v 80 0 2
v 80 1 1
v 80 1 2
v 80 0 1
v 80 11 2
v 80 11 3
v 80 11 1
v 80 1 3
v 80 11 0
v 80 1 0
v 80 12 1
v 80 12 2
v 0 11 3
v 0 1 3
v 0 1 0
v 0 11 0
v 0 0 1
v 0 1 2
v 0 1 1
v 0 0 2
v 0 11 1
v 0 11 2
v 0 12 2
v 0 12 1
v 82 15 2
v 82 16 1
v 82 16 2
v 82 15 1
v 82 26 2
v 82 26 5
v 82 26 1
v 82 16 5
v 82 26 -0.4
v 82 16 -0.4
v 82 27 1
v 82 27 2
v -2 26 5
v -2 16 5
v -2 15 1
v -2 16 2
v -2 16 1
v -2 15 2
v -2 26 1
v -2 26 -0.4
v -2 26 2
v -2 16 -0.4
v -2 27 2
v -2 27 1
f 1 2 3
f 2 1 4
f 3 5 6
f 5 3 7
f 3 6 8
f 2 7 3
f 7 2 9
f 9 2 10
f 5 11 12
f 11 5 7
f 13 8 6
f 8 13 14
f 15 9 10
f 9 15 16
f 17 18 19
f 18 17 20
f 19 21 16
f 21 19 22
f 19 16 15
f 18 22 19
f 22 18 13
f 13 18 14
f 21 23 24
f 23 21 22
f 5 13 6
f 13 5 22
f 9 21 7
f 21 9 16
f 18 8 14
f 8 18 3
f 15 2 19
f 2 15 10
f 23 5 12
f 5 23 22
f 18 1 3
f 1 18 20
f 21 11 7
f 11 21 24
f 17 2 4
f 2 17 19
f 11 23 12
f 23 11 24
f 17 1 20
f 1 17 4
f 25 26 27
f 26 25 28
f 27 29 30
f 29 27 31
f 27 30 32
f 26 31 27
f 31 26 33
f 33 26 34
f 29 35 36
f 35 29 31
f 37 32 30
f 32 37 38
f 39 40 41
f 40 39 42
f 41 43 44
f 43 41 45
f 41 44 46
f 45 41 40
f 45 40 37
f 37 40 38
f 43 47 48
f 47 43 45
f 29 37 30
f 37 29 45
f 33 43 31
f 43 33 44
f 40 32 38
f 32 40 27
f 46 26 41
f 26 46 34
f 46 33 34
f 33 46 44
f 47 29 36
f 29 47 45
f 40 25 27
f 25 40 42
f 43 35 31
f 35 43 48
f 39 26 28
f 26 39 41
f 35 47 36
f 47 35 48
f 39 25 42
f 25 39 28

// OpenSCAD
//Width X is along the rule
//Length Y is perpendicular to the rule
//Height Z is vertical
module slider (
    dispLength=10, 
    totalLength=12, 
    width=80,
    height=3, 
    railHeight=1,
    subtraction=false
    ){
    widthOffset = subtraction ? -2 : 0;
    width = subtraction ? width+4 : width;
    //display
    translate([widthOffset, (totalLength-dispLength)/2, 0]){
        cube([width, dispLength, height]);
    }
    //rails
    translate([widthOffset, 0, (height/2)-(railHeight/2)]){
        cube([width, totalLength, railHeight]);
    }
    if (subtraction){
        translate([widthOffset, (totalLength-dispLength)/2, height-1]){
            cube([width, dispLength, height]);
        }
        translate([widthOffset, (totalLength-dispLength)/2, -0.4]){
            cube([width, dispLength, height]);
        }
    }
}

//Default slider
slider();

//Slider that will be used for subtraction
translate([0, 15, 0]){
    slider(subtraction=true);
}
